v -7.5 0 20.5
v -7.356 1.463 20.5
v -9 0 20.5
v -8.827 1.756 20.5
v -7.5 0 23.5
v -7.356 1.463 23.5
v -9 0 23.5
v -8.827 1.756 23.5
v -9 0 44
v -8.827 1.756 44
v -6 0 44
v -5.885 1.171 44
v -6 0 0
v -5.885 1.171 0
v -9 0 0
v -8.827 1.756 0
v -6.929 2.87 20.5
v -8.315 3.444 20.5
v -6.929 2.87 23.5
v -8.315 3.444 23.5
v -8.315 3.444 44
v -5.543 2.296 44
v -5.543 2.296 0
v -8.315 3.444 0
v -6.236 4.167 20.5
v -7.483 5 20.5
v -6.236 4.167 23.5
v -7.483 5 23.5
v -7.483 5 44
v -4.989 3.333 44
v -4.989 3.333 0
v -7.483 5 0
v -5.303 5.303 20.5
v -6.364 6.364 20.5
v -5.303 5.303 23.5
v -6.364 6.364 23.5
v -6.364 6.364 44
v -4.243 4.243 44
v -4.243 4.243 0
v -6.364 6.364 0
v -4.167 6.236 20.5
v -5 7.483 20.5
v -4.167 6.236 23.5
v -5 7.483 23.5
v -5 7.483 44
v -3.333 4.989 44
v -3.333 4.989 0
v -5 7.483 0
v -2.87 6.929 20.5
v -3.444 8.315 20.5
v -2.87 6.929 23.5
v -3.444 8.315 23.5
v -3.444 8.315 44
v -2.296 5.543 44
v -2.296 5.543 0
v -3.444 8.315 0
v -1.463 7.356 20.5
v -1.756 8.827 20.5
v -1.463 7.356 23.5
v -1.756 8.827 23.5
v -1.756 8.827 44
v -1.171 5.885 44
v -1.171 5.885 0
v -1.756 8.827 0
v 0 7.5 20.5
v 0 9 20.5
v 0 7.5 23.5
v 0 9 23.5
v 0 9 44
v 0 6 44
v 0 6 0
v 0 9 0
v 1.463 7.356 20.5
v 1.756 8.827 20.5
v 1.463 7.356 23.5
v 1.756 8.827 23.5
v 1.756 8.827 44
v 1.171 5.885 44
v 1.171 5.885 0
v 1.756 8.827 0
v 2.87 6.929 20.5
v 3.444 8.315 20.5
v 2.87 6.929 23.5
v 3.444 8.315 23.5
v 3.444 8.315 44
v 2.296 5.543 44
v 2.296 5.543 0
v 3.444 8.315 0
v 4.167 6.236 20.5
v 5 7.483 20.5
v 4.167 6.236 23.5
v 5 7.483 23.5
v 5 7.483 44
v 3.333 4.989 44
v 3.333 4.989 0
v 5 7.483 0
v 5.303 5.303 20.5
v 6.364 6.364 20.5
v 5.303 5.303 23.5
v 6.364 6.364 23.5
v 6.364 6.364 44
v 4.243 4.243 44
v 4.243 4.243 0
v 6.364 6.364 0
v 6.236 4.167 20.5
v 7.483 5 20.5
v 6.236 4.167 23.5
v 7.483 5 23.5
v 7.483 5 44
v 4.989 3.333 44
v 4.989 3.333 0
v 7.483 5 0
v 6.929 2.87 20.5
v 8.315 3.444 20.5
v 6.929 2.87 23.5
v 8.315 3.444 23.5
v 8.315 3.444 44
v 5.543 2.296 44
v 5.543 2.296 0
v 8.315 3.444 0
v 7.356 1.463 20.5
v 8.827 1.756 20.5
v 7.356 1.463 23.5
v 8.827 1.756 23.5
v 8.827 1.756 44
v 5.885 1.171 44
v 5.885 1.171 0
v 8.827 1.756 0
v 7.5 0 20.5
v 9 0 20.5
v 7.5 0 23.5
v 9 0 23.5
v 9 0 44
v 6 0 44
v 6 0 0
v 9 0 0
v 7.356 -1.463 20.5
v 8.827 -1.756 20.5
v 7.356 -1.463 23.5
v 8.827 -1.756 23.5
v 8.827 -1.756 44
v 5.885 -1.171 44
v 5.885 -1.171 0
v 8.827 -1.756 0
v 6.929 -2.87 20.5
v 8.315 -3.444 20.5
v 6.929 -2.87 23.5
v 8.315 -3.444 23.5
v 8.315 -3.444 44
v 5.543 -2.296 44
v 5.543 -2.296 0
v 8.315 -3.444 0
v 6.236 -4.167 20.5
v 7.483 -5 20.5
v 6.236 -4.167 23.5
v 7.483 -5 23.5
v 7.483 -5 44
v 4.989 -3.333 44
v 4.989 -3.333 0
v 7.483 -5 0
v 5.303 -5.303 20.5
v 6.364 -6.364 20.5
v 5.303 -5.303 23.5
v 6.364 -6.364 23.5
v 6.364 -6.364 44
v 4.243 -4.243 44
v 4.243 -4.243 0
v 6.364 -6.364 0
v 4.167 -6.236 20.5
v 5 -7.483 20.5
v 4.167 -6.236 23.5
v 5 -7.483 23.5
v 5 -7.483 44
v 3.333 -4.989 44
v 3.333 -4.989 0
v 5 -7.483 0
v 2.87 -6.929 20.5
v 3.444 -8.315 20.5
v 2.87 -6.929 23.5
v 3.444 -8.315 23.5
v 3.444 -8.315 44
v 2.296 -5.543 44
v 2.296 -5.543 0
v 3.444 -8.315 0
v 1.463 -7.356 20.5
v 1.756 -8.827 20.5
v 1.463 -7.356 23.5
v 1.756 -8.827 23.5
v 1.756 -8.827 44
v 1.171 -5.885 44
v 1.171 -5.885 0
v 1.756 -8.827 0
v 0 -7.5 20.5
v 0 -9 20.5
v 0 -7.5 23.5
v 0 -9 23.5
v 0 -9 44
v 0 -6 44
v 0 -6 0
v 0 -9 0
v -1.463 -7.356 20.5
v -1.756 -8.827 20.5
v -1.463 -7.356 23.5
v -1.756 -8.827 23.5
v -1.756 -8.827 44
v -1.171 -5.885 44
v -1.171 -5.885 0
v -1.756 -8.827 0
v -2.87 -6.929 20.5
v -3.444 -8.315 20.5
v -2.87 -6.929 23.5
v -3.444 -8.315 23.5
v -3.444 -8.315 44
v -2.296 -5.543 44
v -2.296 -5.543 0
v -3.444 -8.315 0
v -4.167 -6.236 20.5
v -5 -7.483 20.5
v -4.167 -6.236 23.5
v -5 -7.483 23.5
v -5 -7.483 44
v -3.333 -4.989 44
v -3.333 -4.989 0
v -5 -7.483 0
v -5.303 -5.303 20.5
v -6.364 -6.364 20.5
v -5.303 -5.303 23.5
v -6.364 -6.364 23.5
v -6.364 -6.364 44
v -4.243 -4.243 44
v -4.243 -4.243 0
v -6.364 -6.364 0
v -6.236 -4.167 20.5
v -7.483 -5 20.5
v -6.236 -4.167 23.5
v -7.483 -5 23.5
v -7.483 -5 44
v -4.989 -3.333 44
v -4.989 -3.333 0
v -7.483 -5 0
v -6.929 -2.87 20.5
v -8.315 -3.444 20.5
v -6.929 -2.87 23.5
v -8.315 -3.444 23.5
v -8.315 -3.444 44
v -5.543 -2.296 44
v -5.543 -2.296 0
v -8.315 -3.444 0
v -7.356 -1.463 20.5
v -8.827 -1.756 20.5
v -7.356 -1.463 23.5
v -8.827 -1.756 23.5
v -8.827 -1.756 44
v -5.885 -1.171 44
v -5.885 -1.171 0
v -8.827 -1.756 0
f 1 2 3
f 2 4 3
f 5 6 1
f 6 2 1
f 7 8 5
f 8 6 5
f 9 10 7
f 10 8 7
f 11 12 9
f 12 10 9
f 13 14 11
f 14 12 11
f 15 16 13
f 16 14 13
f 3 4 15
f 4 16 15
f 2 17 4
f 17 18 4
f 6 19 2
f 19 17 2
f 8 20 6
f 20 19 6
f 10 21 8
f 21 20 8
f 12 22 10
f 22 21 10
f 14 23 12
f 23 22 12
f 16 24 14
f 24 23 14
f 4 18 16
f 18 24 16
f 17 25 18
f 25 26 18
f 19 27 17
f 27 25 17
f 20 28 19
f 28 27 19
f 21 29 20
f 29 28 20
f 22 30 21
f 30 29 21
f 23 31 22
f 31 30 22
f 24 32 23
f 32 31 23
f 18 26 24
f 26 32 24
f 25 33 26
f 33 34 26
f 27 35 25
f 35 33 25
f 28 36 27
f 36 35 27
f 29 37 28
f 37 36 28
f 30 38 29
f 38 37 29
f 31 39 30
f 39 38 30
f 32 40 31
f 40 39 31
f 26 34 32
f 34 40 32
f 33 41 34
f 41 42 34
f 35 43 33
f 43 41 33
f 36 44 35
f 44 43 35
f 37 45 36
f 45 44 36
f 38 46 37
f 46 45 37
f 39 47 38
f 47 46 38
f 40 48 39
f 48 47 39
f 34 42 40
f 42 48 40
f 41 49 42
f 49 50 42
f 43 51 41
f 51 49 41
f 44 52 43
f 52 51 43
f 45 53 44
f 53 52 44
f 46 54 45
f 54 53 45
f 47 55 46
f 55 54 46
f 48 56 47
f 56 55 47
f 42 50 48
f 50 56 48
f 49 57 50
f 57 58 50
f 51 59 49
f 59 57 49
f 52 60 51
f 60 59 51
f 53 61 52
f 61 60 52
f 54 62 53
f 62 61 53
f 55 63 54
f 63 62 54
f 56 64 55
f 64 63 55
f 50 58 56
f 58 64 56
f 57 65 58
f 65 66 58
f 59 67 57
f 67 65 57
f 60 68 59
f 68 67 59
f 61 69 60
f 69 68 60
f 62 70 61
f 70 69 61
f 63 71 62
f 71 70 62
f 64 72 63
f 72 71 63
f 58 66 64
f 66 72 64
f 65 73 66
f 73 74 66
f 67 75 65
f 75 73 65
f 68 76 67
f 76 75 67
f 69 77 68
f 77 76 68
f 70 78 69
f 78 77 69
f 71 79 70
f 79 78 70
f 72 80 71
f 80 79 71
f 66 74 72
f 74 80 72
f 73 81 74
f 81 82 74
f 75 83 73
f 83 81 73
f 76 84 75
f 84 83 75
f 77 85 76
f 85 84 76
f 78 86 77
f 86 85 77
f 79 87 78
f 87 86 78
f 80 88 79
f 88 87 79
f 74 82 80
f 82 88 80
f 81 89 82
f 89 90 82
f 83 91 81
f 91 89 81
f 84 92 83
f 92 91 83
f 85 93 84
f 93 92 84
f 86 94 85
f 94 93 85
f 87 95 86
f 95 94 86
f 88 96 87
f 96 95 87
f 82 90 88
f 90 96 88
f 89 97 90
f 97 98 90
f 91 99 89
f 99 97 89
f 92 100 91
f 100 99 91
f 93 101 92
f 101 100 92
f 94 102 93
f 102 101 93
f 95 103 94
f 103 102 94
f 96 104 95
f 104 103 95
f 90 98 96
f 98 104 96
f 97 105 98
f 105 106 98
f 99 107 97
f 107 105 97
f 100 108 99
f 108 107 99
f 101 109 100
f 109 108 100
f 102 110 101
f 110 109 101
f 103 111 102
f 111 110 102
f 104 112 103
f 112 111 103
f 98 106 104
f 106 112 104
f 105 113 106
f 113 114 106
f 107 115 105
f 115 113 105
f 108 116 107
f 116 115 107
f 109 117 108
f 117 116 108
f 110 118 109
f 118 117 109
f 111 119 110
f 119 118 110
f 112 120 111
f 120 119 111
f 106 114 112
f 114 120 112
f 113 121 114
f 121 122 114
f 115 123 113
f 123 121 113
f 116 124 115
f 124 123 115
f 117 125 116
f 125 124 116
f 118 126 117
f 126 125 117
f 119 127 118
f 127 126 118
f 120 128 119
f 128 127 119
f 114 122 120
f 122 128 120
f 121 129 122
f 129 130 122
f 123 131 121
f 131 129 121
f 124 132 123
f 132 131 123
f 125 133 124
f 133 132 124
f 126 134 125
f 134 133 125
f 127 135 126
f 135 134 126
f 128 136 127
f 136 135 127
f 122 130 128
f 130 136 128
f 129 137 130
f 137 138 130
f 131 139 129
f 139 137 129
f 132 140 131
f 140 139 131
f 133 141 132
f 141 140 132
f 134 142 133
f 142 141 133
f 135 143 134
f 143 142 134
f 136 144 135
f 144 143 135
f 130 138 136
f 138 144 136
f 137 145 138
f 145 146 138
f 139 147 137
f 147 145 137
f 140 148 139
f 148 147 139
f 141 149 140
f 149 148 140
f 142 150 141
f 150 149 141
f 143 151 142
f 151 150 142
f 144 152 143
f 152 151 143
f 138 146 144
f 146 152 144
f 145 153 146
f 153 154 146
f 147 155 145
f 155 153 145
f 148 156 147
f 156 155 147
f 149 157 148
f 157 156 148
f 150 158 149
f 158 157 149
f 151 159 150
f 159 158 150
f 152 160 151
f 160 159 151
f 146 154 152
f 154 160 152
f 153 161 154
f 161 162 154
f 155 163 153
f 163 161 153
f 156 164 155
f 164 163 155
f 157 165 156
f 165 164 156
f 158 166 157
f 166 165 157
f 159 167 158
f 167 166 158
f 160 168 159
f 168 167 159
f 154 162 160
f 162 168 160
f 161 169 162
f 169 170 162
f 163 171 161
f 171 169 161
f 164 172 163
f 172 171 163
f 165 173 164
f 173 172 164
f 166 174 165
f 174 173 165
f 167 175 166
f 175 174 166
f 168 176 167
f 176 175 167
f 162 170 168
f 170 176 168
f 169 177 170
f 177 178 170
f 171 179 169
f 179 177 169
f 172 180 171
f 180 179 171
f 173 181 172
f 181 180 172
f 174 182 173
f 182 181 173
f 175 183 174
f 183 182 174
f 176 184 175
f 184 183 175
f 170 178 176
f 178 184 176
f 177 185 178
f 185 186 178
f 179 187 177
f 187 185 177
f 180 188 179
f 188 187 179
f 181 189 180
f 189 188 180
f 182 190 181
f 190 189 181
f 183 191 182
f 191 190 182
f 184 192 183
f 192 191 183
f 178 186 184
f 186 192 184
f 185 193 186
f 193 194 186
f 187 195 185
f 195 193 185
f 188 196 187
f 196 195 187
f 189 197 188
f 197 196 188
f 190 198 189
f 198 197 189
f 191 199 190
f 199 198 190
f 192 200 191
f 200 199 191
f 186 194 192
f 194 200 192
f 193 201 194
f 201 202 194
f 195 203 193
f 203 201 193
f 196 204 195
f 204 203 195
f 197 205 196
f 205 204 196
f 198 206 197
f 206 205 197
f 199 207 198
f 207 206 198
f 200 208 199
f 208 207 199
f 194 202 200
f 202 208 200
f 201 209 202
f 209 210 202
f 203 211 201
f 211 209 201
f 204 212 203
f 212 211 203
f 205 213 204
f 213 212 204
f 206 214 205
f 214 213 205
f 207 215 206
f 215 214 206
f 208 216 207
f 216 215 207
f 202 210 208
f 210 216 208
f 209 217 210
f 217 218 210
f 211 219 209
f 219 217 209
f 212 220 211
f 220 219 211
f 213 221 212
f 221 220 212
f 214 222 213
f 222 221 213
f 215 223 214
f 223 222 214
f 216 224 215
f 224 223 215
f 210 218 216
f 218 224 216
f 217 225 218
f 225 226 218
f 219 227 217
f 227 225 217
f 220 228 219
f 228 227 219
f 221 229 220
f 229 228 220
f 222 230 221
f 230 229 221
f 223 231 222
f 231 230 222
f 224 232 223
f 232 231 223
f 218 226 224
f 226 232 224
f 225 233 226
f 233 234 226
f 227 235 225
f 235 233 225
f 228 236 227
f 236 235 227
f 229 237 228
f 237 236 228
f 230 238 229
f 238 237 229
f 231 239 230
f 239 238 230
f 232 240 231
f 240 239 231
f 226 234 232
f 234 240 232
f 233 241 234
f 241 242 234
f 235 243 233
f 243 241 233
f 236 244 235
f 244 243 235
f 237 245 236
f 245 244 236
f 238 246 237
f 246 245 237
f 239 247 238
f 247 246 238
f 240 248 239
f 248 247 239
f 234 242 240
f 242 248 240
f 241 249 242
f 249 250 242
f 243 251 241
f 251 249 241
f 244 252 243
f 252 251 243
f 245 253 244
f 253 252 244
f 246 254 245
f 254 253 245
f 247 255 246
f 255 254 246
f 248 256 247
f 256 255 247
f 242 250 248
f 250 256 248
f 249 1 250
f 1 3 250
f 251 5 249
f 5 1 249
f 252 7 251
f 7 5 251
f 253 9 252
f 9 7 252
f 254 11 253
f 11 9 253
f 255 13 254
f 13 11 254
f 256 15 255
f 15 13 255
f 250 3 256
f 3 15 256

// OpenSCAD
$fn = 32;

// ----------------------------------------------------------------------
// Grooved revolve: plain_grooves, bore R6
// ----------------------------------------------------------------------

// --- parameters (mm) ---
bore_r = 6;               // bore radius
outer_r = 9;              // outer radius of the body
total_h = 44;             // overall height, Z
wall = 3;                 // radial wall thickness
groove_w = 3;             // groove width
groove_d = 1.5;           // groove depth
grooves = 1;              // number of outer grooves

bbox_x = 2 * outer_r;  // full diameter
bore_d = 2 * bore_r;  // bore diameter
body_d = 2 * outer_r;  // body diameter
revolve_angle = 360;  // full turn around the Z axis

profile = [[6, 0], [9, 0], [9, 20.5], [7.5, 20.5], [7.5, 23.5], [9, 23.5], [9, 44], [6, 44]];  // primary outline, 8 points, counter clockwise

// --- the one profile operation ---
rotate_extrude(angle = revolve_angle) polygon(points = profile);
